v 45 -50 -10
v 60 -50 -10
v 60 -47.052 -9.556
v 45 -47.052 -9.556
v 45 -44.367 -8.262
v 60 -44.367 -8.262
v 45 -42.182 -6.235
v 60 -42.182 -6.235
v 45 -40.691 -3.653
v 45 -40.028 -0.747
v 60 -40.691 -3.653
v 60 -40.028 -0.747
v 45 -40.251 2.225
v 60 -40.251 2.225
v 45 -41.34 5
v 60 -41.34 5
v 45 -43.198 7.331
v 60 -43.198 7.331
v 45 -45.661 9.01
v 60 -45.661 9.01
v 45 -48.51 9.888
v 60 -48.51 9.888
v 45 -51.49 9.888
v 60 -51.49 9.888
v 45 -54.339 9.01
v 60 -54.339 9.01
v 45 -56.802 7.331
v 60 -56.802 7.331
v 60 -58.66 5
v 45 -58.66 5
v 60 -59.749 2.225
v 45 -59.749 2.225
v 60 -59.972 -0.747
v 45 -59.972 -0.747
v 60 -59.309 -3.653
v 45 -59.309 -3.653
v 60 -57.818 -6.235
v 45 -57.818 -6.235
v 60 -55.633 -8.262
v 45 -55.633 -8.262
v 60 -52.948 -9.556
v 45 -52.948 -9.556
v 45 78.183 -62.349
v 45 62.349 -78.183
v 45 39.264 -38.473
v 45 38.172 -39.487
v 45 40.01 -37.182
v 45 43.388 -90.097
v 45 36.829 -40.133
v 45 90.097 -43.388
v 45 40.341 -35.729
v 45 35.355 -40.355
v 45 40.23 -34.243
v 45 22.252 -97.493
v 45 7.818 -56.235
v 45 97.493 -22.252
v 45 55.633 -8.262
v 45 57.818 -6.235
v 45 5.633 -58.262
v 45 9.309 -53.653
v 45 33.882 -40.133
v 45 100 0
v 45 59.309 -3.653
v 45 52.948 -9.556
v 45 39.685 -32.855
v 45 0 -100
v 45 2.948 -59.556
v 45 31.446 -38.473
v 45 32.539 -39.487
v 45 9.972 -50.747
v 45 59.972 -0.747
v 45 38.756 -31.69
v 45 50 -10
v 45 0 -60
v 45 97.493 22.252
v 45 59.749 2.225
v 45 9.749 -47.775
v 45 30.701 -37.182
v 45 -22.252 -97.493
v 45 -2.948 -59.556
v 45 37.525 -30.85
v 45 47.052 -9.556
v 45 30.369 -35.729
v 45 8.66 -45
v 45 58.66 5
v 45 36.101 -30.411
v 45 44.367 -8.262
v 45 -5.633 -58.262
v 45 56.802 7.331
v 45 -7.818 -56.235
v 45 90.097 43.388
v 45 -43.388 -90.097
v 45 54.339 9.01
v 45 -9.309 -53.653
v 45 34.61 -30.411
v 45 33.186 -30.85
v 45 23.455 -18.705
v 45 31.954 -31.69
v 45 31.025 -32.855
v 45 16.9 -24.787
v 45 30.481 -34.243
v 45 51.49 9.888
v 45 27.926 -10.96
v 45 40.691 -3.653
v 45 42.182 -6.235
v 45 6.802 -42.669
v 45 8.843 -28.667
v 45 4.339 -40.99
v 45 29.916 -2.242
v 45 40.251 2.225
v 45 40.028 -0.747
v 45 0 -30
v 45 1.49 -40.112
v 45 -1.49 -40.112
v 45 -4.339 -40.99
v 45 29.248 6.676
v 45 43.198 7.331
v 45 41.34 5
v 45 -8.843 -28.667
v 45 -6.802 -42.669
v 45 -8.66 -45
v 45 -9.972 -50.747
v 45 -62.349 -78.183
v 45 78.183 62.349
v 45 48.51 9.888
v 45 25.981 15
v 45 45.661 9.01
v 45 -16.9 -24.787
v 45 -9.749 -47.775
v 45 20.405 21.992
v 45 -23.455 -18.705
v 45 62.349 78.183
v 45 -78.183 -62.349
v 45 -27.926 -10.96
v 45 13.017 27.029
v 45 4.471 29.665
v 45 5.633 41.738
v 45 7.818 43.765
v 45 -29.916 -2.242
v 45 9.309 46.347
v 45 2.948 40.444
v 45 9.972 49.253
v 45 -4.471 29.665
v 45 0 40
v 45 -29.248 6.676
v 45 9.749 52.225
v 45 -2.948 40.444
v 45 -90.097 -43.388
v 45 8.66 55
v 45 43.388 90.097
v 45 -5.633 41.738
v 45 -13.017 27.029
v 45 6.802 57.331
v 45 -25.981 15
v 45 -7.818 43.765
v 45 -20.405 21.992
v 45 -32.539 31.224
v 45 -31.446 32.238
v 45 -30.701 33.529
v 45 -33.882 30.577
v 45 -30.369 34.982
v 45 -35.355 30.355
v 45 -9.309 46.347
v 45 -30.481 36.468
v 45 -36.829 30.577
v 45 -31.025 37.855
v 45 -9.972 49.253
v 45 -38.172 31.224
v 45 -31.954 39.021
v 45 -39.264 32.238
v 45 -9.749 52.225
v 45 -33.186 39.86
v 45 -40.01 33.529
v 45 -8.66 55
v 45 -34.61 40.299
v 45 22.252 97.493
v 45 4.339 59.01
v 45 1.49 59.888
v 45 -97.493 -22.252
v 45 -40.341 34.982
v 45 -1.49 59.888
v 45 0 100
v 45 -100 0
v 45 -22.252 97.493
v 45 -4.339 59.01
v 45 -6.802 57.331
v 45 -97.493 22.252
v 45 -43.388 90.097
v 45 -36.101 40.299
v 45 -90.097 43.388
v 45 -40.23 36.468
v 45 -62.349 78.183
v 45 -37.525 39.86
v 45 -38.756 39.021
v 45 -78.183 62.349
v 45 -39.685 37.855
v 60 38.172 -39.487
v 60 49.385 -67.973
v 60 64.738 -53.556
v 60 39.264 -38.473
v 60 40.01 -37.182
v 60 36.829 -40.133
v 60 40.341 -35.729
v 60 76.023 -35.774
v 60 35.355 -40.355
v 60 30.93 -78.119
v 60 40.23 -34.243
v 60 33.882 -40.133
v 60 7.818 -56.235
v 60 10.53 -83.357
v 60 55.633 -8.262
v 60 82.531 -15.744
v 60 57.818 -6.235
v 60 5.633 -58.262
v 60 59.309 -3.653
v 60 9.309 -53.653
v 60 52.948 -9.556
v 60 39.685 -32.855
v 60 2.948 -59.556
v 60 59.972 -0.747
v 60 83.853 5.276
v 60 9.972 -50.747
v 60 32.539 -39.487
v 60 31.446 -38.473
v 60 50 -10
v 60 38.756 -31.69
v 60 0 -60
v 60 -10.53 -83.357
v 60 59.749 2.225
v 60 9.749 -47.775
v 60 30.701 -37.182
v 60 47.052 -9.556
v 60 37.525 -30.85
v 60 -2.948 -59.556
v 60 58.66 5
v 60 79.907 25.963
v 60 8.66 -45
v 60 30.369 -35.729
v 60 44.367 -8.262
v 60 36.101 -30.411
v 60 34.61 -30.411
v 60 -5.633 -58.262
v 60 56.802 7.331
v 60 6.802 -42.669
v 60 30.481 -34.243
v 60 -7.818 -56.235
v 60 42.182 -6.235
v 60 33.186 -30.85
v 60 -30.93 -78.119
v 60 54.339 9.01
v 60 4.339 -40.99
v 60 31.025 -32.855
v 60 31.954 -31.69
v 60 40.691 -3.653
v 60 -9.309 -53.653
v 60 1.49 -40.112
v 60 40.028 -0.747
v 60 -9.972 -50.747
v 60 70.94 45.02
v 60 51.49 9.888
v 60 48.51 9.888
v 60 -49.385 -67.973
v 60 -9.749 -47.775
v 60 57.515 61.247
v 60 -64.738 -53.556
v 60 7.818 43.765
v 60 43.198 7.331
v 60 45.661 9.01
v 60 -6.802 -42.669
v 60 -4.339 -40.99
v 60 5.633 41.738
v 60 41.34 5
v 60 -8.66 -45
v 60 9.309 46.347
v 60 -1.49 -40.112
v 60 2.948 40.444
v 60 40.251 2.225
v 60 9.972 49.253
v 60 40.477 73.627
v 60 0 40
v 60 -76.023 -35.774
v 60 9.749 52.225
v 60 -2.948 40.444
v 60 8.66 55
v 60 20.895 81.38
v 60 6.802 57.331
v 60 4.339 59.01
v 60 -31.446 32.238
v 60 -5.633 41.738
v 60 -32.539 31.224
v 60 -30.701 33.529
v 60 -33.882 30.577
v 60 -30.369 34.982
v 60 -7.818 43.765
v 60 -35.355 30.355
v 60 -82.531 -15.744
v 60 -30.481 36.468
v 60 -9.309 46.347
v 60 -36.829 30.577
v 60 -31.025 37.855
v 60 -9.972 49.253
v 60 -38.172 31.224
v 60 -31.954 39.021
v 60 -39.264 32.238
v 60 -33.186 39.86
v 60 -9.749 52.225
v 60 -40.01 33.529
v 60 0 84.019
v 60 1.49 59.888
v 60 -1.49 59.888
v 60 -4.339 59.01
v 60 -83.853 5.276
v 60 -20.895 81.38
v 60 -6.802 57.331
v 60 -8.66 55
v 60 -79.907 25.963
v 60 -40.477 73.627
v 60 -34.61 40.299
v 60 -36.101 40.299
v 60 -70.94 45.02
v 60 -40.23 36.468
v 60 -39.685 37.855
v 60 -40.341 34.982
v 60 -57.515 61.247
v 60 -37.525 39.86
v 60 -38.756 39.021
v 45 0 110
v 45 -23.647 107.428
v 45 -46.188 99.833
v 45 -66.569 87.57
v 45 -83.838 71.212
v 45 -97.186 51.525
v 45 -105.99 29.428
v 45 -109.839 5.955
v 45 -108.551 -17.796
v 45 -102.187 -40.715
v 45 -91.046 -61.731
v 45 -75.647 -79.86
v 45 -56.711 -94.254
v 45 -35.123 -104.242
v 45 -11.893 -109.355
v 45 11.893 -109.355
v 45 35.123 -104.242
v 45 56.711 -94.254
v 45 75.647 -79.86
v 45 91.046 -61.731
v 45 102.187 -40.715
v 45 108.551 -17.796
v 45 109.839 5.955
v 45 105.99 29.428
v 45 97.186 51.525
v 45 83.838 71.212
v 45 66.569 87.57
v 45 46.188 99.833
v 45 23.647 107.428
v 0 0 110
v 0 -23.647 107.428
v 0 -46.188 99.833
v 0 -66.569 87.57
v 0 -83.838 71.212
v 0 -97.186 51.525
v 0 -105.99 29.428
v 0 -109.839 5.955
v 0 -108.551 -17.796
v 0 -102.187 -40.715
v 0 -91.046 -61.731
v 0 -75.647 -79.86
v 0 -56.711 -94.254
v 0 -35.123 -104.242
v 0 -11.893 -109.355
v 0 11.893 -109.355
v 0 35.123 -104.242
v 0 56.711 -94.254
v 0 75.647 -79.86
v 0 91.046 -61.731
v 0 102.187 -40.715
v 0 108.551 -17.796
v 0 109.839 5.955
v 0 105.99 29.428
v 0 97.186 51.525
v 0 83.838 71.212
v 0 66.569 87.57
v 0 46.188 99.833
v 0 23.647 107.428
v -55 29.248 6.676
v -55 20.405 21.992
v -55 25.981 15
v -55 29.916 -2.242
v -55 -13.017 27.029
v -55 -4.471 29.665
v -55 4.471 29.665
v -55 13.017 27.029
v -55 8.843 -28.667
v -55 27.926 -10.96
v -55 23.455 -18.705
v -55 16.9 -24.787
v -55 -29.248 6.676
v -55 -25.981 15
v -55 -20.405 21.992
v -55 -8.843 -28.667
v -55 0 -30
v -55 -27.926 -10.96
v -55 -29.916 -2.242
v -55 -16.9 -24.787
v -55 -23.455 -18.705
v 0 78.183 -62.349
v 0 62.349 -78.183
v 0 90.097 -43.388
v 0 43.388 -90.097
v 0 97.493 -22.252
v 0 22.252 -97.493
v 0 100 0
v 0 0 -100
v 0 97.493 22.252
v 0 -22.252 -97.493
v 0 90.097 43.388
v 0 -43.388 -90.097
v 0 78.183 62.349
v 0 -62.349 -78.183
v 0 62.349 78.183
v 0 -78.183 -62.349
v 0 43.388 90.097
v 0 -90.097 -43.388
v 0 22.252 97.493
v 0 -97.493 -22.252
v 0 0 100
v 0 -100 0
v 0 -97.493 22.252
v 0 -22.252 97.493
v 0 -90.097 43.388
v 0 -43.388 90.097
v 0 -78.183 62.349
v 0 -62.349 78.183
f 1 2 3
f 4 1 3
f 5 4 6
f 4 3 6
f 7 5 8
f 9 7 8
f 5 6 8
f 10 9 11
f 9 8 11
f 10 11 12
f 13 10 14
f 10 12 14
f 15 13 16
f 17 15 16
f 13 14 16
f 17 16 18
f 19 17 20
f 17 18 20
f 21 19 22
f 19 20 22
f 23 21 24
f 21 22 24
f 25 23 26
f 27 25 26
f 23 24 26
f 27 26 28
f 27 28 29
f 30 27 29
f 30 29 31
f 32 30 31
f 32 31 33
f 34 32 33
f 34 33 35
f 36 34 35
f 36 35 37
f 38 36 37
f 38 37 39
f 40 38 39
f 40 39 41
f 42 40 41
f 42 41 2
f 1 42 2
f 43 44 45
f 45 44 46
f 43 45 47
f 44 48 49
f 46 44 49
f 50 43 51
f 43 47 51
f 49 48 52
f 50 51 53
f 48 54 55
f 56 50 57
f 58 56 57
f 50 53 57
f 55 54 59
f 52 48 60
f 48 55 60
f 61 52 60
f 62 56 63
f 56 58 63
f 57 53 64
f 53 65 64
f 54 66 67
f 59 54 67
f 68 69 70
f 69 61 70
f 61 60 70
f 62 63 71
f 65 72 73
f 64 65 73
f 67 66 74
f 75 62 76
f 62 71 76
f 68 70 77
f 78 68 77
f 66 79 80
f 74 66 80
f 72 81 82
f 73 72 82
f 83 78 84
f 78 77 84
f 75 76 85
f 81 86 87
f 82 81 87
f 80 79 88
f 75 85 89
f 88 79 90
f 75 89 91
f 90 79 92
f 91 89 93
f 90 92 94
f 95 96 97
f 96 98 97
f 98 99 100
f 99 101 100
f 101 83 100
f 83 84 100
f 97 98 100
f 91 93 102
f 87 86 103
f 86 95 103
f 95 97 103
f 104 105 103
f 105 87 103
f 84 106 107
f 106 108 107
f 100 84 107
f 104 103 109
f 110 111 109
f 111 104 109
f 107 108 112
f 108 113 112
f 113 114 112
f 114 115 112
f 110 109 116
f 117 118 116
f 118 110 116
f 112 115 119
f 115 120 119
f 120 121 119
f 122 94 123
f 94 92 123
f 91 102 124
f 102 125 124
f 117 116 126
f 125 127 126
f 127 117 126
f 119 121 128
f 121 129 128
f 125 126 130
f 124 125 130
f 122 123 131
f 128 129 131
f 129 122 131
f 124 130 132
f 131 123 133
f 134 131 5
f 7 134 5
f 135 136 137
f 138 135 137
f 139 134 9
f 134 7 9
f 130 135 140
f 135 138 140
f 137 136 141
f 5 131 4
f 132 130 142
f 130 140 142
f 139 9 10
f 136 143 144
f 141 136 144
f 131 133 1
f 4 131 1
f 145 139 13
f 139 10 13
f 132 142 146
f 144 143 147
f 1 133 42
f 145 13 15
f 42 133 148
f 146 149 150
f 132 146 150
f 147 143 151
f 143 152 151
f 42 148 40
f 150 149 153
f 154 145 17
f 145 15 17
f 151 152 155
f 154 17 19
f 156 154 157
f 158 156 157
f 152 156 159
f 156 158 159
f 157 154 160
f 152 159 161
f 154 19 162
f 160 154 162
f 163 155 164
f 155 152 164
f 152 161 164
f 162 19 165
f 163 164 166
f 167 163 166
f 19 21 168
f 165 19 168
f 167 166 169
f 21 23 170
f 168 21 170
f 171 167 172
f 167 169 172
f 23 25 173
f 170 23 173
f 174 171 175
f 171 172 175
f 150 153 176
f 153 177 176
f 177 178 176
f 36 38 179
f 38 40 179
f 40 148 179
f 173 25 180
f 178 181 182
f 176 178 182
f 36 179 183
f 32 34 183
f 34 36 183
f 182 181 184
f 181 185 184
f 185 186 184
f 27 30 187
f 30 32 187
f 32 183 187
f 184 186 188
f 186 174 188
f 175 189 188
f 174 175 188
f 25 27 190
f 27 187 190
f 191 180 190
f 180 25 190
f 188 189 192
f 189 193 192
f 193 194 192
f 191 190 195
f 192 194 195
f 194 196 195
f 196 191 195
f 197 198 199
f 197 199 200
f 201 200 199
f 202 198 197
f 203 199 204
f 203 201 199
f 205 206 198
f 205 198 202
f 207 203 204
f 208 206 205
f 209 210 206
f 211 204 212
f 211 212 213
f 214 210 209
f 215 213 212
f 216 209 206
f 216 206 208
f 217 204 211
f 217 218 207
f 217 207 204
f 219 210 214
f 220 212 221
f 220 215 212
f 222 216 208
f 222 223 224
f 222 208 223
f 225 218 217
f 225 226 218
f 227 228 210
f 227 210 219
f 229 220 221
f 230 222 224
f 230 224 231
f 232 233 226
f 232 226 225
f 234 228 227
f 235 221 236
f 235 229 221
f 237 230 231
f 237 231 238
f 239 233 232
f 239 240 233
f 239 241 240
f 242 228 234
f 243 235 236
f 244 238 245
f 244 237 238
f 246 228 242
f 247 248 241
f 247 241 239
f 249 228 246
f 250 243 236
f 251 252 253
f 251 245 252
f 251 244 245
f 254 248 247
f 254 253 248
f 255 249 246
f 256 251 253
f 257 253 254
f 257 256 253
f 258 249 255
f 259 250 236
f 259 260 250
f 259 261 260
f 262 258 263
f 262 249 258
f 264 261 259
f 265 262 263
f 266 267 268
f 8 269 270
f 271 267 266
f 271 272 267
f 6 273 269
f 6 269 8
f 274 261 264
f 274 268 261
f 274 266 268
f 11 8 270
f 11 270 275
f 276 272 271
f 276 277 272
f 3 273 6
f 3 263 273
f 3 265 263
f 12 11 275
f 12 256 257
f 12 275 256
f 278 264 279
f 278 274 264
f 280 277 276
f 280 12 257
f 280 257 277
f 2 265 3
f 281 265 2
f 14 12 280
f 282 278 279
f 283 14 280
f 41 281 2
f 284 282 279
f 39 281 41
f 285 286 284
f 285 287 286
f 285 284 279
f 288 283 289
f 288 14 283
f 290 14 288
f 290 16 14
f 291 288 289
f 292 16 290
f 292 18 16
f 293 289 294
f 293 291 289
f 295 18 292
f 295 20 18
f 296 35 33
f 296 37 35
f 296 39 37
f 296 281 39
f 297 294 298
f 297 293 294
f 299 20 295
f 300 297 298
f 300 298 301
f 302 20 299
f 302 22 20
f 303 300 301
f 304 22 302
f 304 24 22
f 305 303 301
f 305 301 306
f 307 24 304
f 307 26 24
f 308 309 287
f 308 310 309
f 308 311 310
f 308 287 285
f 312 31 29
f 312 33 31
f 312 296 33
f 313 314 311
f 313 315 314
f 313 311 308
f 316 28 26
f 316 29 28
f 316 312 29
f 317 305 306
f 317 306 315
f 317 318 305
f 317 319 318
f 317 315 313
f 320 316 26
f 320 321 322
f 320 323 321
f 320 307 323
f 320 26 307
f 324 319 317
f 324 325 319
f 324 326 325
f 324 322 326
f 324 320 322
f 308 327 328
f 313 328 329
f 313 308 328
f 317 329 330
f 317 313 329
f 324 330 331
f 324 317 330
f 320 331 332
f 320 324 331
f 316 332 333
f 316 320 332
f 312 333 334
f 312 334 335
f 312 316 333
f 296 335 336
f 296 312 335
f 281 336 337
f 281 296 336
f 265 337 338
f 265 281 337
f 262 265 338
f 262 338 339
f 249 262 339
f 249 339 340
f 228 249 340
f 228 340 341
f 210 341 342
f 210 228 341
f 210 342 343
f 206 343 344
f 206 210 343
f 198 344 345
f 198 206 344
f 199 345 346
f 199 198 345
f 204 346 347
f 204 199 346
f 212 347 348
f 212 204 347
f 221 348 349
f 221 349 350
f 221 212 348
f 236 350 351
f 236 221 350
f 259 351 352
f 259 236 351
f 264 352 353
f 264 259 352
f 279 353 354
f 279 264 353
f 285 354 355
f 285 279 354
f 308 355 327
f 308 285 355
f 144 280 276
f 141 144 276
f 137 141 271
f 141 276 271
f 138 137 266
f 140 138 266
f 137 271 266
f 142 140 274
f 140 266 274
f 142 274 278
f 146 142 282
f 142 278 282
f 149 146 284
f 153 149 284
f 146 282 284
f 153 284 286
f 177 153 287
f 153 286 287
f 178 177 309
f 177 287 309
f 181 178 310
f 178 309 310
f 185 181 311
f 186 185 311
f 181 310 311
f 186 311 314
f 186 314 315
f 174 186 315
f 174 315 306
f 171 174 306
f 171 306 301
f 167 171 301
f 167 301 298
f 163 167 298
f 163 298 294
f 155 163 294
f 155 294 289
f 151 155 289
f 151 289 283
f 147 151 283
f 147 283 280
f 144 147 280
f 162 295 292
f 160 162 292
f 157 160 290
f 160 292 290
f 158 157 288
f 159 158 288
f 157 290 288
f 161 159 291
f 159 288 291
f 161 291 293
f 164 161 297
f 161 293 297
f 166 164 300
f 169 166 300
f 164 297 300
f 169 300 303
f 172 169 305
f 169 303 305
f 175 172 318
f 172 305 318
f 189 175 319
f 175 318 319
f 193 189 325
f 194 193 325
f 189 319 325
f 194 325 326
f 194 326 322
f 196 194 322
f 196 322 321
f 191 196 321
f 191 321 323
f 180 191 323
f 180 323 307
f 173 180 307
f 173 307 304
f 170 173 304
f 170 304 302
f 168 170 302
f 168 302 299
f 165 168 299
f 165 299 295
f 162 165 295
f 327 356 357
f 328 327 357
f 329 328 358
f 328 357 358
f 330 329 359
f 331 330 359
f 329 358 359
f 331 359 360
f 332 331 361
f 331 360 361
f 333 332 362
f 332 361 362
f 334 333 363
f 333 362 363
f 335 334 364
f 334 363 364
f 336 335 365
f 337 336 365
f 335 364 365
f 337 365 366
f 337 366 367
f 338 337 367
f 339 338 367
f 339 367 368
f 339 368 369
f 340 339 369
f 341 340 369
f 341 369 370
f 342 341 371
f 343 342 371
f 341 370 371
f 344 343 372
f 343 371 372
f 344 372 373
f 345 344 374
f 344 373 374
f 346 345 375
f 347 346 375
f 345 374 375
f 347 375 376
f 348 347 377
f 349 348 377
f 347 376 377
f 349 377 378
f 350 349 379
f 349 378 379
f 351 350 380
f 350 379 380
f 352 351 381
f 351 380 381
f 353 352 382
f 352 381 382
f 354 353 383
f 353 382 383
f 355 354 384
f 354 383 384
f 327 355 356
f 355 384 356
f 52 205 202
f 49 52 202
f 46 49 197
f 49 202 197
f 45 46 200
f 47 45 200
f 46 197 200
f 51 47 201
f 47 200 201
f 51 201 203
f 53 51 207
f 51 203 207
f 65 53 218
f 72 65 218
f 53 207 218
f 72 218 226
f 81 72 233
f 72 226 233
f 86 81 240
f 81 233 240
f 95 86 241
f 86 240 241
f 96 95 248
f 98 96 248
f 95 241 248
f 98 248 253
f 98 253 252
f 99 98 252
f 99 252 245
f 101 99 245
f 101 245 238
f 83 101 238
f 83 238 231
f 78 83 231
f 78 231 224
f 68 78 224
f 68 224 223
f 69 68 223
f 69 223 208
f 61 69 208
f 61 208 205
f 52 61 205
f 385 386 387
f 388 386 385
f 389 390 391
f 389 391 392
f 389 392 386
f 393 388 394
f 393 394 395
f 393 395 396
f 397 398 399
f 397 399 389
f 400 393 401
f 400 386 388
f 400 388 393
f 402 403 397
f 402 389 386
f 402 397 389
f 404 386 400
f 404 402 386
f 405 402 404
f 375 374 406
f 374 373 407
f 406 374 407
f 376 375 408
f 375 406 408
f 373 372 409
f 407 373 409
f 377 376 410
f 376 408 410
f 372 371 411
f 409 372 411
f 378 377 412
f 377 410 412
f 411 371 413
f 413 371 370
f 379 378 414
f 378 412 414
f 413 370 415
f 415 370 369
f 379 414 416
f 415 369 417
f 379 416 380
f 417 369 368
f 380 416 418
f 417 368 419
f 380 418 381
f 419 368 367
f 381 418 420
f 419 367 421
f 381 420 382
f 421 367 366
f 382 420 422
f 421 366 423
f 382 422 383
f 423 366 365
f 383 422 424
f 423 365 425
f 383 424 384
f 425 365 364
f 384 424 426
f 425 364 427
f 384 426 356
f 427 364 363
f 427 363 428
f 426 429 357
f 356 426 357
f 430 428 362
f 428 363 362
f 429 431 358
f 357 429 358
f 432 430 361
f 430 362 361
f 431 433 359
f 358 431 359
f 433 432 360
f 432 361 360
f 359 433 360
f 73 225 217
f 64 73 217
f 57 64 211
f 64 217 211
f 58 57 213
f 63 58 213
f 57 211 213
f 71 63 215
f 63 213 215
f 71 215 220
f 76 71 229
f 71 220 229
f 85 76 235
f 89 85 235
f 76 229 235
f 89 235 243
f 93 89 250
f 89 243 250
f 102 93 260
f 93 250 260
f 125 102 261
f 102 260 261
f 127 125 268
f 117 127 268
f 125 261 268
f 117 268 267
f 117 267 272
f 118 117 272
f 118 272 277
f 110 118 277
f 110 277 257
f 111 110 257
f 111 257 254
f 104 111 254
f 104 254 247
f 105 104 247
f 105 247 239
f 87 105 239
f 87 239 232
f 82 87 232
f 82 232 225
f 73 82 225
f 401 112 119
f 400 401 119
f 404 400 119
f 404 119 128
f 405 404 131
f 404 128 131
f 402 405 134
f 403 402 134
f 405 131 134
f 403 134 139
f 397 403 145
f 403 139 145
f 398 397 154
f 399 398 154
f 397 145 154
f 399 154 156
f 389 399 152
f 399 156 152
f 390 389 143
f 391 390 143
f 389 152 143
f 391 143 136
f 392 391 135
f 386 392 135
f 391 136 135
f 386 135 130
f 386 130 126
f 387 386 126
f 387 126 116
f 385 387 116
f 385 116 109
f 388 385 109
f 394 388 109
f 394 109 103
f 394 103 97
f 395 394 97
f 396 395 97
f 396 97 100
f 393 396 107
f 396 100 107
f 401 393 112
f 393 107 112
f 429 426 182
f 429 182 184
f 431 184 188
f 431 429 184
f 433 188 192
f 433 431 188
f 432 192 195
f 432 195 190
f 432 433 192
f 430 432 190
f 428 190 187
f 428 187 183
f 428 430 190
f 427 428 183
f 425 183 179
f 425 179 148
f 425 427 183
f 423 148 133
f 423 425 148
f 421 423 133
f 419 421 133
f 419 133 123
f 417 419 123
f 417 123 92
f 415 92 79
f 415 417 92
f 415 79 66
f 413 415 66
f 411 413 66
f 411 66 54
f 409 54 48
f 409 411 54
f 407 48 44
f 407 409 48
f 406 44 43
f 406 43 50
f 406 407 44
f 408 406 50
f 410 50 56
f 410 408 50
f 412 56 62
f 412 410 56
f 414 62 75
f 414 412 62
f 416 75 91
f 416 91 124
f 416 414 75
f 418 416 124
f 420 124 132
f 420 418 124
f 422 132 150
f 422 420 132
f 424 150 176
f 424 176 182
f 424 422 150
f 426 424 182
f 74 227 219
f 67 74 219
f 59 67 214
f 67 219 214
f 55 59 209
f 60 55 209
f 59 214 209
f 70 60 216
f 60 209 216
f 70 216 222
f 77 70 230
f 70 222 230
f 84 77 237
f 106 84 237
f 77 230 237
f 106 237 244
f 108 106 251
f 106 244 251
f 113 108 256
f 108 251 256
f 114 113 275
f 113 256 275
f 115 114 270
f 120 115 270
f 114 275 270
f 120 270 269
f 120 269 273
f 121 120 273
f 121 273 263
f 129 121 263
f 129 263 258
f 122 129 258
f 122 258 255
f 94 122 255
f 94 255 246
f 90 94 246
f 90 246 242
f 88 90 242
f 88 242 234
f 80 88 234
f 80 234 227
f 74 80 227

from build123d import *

# Parameters (mm, degrees)
SKETCH1_R           = 110
SKETCH1_R_2         = 100
BOSS_EXTRUDE1_DEPTH = 45
SKETCH2_R           = 110
BOSS_EXTRUDE2_DEPTH = 15
BOSS_EXTRUDE2_TAPER = 60
SKETCH3_R           = 30
BOSS_EXTRUDE3_DEPTH = 100
SKETCH4_R           = 10
SKETCH4_R_2         = 5
CUT_EXTRUDE1_DEPTH  = 100


with BuildPart() as part:
    # Sketch1 → Boss-Extrude1 (new body)
    with BuildSketch(Plane(origin=(0, 0, 0), x_dir=(0, 0, -1), z_dir=(1, 0, 0))):
        with Locations(Location((0, 0, 0), (0, 0, 180))):
            Circle(SKETCH1_R)
        with Locations(Location((0, 0, 0), (0, 0, 180))):
            Circle(SKETCH1_R_2, mode=Mode.SUBTRACT)
    extrude(amount=BOSS_EXTRUDE1_DEPTH)

    # Sketch2 → Boss-Extrude2 (add)
    with BuildSketch(Plane(origin=(45, 0, 0), x_dir=(0, 0, -1), z_dir=(1, 0, 0))):
        with Locations(Location((0, 0, 0), (0, 0, 180))):
            Circle(SKETCH2_R)
    extrude(amount=BOSS_EXTRUDE2_DEPTH, taper=BOSS_EXTRUDE2_TAPER)

    # Sketch3 → Boss-Extrude3 (add)
    with BuildSketch(Plane.ZY.offset(-45)):
        with Locations(Location((0, 0, 0), (0, 0, 180))):
            Circle(SKETCH3_R)
    extrude(amount=BOSS_EXTRUDE3_DEPTH)

    # Sketch4 → Cut-Extrude1 (cut)
    with BuildSketch(Plane(origin=(60, 0, 0), x_dir=(0, 0, -1), z_dir=(1, 0, 0))):
        with Locations((0, 50)):
            Circle(SKETCH4_R)
        with Locations((50, 0)):
            Circle(SKETCH4_R)
        with Locations((0, -50)):
            Circle(SKETCH4_R)
        with Locations((-50, 0)):
            Circle(SKETCH4_R)
        with Locations((35.355339059, 35.355339059)):
            Circle(SKETCH4_R_2)
        with Locations((-35.355339059, -35.355339059)):
            Circle(SKETCH4_R_2)
    extrude(amount=-CUT_EXTRUDE1_DEPTH, mode=Mode.SUBTRACT)


solid = part.part
